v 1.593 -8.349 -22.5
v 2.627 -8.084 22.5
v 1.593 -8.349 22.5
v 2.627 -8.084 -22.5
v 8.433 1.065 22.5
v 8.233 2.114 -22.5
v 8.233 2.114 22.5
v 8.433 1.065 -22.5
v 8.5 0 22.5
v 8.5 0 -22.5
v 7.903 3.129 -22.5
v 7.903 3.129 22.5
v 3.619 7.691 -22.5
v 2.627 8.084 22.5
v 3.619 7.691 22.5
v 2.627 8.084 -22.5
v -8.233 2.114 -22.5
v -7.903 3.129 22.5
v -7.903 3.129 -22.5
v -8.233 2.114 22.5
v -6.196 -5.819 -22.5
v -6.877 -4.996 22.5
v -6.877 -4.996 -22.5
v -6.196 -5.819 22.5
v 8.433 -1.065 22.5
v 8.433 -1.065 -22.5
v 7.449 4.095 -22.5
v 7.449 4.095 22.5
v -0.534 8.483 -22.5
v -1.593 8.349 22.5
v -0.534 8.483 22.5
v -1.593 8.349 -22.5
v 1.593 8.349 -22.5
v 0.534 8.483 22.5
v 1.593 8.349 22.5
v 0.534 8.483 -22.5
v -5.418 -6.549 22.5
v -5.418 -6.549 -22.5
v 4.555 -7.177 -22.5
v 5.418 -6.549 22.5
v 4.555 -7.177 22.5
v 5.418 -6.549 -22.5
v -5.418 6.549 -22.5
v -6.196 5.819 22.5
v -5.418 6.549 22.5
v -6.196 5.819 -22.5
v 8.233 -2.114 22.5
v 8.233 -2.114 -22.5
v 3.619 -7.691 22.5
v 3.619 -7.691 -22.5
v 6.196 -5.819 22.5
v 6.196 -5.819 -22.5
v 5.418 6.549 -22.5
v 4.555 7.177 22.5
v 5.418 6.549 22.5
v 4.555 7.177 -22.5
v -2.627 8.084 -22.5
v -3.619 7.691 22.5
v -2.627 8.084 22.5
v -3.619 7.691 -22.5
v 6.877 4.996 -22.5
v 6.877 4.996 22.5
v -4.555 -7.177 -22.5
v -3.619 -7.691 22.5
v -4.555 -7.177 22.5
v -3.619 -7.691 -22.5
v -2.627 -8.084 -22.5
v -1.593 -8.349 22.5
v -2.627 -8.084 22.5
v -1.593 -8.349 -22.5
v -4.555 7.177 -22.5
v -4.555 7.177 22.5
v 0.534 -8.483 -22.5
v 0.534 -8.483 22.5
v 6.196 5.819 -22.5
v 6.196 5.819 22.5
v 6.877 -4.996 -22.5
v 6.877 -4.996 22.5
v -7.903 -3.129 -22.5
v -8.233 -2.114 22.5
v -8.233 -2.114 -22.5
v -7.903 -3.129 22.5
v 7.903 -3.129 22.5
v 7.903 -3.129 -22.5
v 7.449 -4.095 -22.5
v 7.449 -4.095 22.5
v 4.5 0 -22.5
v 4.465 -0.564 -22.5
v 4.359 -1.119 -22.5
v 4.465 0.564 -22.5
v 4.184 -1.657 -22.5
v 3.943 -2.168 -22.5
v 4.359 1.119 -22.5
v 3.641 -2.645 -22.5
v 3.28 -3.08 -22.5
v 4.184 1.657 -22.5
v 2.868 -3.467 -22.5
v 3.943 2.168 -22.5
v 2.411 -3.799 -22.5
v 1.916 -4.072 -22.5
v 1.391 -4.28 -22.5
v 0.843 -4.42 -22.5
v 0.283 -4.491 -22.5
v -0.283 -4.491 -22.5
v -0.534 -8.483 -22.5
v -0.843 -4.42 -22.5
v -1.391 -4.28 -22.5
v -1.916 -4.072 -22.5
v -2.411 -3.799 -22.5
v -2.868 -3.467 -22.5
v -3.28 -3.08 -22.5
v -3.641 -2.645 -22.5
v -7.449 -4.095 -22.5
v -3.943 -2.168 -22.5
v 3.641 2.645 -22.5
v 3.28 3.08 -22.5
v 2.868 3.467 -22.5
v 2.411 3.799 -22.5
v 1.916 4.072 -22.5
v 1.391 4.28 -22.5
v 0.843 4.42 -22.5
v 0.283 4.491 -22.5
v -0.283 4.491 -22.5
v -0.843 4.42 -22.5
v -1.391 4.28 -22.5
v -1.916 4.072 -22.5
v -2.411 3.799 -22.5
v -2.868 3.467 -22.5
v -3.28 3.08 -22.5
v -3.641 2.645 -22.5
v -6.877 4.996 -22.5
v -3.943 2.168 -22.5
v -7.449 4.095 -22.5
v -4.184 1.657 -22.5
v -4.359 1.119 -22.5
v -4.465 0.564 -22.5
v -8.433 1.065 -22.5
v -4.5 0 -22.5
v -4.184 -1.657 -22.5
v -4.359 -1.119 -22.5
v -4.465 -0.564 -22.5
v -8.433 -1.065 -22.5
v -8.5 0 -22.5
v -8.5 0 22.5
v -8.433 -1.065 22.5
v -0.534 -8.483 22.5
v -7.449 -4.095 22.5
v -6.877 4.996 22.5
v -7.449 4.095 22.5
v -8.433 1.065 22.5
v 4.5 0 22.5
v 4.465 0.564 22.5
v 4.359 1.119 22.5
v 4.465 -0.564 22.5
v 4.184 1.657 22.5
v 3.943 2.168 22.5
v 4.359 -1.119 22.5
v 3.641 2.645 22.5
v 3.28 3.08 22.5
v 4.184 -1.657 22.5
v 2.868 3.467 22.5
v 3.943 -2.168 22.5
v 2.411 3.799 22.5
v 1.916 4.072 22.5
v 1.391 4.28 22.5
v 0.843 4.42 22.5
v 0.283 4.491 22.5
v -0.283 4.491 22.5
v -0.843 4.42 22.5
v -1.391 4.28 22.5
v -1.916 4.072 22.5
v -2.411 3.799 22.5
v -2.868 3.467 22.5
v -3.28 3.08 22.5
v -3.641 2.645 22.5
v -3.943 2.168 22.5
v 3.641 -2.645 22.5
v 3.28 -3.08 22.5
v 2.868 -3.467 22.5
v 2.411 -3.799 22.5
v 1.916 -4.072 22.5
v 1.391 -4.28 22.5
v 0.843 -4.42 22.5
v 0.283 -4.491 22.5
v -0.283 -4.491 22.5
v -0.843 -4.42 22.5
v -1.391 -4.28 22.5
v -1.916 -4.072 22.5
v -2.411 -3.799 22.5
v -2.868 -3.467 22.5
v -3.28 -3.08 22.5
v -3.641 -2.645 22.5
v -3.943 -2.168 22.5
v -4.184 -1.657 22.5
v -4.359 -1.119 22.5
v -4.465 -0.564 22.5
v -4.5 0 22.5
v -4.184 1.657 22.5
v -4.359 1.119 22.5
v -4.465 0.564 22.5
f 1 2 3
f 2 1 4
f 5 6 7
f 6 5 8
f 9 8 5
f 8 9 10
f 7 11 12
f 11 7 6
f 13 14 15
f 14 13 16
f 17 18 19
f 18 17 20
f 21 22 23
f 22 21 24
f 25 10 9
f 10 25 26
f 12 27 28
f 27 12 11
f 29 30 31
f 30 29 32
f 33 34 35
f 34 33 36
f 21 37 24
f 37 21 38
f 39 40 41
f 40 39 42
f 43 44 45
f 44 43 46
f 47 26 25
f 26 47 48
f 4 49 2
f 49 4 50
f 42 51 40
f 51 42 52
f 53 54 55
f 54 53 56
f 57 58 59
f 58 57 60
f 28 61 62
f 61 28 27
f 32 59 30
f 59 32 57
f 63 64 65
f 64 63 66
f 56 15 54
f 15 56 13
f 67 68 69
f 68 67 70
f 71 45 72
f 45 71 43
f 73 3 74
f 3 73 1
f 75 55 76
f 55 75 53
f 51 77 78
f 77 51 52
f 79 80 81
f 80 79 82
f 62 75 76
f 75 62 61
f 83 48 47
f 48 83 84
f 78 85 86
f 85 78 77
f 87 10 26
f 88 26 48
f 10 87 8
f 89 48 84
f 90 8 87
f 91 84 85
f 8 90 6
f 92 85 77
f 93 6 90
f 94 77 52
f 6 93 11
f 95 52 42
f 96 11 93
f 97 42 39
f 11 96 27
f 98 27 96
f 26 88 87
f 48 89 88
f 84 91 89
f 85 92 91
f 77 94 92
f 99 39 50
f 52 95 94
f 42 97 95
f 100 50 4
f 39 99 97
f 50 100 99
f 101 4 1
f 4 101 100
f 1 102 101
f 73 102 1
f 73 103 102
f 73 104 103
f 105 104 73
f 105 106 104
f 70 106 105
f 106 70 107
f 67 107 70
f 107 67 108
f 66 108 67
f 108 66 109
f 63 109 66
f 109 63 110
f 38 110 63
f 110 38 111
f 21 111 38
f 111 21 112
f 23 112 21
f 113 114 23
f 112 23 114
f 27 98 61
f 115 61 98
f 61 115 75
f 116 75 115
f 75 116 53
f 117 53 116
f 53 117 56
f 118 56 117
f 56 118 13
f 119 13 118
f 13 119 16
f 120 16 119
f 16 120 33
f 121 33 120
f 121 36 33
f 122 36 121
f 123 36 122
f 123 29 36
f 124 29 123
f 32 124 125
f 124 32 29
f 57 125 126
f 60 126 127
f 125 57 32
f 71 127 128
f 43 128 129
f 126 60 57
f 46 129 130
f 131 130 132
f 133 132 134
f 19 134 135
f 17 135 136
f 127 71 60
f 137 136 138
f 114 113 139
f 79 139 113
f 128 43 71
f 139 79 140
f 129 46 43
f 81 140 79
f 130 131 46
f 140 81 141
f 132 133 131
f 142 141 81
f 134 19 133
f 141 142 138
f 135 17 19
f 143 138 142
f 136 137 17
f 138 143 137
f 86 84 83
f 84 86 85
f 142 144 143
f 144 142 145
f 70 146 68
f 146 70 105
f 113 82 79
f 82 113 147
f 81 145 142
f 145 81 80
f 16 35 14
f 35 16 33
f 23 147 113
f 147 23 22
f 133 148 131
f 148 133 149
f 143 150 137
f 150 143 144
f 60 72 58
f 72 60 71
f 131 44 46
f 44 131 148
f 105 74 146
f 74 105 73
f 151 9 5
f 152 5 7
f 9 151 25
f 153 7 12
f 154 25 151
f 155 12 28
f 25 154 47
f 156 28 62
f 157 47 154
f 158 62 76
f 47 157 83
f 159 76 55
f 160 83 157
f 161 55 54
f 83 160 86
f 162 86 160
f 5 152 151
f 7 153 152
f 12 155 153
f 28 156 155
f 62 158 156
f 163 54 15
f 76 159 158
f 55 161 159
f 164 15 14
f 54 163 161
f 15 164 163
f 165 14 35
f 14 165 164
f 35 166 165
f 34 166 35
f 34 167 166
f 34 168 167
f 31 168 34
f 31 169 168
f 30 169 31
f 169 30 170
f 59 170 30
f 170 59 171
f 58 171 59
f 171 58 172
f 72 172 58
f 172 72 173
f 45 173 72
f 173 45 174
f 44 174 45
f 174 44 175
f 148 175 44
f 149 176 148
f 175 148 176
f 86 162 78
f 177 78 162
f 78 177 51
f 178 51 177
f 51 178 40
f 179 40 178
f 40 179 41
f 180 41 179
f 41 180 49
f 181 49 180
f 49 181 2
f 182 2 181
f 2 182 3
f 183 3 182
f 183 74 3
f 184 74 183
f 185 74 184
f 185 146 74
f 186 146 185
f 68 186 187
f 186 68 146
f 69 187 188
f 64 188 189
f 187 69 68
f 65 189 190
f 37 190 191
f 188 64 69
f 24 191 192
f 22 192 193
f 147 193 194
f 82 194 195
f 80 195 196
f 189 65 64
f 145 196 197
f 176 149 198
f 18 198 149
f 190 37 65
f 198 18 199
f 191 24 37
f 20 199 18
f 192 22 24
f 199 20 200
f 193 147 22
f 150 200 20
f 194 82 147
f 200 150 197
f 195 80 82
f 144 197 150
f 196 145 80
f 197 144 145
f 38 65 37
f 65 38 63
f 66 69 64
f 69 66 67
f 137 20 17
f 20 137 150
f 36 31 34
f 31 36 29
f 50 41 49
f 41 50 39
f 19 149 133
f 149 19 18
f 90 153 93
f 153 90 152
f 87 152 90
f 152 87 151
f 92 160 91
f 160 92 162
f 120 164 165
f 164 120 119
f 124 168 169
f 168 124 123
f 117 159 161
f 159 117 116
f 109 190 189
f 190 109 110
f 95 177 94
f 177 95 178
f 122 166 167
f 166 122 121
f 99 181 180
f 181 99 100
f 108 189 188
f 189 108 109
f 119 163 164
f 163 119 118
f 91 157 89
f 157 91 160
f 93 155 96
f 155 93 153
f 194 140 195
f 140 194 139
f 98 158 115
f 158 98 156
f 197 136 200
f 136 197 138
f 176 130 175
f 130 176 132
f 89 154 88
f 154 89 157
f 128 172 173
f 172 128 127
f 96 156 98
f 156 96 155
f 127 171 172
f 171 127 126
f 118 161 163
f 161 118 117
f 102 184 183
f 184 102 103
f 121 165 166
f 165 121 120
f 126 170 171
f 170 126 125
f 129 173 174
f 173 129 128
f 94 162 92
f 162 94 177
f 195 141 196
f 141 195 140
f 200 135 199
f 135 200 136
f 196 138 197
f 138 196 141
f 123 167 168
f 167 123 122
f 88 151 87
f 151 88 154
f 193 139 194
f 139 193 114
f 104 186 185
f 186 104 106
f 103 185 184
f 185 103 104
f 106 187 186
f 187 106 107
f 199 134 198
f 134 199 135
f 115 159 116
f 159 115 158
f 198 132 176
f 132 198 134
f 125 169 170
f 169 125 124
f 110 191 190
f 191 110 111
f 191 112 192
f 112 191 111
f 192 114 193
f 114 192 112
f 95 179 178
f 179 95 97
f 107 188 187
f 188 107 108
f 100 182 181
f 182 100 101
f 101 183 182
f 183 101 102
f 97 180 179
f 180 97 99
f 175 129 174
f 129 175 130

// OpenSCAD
$fn = 50;


difference() {
	union() {
		translate(v = [0, 0, -22.5000000000]) {
			cylinder(h = 45, r = 8.5000000000);
		}
	}
	union() {
		translate(v = [0, 0, -100.0000000000]) {
			cylinder(h = 200, r = 4.5000000000);
		}
	}
}
